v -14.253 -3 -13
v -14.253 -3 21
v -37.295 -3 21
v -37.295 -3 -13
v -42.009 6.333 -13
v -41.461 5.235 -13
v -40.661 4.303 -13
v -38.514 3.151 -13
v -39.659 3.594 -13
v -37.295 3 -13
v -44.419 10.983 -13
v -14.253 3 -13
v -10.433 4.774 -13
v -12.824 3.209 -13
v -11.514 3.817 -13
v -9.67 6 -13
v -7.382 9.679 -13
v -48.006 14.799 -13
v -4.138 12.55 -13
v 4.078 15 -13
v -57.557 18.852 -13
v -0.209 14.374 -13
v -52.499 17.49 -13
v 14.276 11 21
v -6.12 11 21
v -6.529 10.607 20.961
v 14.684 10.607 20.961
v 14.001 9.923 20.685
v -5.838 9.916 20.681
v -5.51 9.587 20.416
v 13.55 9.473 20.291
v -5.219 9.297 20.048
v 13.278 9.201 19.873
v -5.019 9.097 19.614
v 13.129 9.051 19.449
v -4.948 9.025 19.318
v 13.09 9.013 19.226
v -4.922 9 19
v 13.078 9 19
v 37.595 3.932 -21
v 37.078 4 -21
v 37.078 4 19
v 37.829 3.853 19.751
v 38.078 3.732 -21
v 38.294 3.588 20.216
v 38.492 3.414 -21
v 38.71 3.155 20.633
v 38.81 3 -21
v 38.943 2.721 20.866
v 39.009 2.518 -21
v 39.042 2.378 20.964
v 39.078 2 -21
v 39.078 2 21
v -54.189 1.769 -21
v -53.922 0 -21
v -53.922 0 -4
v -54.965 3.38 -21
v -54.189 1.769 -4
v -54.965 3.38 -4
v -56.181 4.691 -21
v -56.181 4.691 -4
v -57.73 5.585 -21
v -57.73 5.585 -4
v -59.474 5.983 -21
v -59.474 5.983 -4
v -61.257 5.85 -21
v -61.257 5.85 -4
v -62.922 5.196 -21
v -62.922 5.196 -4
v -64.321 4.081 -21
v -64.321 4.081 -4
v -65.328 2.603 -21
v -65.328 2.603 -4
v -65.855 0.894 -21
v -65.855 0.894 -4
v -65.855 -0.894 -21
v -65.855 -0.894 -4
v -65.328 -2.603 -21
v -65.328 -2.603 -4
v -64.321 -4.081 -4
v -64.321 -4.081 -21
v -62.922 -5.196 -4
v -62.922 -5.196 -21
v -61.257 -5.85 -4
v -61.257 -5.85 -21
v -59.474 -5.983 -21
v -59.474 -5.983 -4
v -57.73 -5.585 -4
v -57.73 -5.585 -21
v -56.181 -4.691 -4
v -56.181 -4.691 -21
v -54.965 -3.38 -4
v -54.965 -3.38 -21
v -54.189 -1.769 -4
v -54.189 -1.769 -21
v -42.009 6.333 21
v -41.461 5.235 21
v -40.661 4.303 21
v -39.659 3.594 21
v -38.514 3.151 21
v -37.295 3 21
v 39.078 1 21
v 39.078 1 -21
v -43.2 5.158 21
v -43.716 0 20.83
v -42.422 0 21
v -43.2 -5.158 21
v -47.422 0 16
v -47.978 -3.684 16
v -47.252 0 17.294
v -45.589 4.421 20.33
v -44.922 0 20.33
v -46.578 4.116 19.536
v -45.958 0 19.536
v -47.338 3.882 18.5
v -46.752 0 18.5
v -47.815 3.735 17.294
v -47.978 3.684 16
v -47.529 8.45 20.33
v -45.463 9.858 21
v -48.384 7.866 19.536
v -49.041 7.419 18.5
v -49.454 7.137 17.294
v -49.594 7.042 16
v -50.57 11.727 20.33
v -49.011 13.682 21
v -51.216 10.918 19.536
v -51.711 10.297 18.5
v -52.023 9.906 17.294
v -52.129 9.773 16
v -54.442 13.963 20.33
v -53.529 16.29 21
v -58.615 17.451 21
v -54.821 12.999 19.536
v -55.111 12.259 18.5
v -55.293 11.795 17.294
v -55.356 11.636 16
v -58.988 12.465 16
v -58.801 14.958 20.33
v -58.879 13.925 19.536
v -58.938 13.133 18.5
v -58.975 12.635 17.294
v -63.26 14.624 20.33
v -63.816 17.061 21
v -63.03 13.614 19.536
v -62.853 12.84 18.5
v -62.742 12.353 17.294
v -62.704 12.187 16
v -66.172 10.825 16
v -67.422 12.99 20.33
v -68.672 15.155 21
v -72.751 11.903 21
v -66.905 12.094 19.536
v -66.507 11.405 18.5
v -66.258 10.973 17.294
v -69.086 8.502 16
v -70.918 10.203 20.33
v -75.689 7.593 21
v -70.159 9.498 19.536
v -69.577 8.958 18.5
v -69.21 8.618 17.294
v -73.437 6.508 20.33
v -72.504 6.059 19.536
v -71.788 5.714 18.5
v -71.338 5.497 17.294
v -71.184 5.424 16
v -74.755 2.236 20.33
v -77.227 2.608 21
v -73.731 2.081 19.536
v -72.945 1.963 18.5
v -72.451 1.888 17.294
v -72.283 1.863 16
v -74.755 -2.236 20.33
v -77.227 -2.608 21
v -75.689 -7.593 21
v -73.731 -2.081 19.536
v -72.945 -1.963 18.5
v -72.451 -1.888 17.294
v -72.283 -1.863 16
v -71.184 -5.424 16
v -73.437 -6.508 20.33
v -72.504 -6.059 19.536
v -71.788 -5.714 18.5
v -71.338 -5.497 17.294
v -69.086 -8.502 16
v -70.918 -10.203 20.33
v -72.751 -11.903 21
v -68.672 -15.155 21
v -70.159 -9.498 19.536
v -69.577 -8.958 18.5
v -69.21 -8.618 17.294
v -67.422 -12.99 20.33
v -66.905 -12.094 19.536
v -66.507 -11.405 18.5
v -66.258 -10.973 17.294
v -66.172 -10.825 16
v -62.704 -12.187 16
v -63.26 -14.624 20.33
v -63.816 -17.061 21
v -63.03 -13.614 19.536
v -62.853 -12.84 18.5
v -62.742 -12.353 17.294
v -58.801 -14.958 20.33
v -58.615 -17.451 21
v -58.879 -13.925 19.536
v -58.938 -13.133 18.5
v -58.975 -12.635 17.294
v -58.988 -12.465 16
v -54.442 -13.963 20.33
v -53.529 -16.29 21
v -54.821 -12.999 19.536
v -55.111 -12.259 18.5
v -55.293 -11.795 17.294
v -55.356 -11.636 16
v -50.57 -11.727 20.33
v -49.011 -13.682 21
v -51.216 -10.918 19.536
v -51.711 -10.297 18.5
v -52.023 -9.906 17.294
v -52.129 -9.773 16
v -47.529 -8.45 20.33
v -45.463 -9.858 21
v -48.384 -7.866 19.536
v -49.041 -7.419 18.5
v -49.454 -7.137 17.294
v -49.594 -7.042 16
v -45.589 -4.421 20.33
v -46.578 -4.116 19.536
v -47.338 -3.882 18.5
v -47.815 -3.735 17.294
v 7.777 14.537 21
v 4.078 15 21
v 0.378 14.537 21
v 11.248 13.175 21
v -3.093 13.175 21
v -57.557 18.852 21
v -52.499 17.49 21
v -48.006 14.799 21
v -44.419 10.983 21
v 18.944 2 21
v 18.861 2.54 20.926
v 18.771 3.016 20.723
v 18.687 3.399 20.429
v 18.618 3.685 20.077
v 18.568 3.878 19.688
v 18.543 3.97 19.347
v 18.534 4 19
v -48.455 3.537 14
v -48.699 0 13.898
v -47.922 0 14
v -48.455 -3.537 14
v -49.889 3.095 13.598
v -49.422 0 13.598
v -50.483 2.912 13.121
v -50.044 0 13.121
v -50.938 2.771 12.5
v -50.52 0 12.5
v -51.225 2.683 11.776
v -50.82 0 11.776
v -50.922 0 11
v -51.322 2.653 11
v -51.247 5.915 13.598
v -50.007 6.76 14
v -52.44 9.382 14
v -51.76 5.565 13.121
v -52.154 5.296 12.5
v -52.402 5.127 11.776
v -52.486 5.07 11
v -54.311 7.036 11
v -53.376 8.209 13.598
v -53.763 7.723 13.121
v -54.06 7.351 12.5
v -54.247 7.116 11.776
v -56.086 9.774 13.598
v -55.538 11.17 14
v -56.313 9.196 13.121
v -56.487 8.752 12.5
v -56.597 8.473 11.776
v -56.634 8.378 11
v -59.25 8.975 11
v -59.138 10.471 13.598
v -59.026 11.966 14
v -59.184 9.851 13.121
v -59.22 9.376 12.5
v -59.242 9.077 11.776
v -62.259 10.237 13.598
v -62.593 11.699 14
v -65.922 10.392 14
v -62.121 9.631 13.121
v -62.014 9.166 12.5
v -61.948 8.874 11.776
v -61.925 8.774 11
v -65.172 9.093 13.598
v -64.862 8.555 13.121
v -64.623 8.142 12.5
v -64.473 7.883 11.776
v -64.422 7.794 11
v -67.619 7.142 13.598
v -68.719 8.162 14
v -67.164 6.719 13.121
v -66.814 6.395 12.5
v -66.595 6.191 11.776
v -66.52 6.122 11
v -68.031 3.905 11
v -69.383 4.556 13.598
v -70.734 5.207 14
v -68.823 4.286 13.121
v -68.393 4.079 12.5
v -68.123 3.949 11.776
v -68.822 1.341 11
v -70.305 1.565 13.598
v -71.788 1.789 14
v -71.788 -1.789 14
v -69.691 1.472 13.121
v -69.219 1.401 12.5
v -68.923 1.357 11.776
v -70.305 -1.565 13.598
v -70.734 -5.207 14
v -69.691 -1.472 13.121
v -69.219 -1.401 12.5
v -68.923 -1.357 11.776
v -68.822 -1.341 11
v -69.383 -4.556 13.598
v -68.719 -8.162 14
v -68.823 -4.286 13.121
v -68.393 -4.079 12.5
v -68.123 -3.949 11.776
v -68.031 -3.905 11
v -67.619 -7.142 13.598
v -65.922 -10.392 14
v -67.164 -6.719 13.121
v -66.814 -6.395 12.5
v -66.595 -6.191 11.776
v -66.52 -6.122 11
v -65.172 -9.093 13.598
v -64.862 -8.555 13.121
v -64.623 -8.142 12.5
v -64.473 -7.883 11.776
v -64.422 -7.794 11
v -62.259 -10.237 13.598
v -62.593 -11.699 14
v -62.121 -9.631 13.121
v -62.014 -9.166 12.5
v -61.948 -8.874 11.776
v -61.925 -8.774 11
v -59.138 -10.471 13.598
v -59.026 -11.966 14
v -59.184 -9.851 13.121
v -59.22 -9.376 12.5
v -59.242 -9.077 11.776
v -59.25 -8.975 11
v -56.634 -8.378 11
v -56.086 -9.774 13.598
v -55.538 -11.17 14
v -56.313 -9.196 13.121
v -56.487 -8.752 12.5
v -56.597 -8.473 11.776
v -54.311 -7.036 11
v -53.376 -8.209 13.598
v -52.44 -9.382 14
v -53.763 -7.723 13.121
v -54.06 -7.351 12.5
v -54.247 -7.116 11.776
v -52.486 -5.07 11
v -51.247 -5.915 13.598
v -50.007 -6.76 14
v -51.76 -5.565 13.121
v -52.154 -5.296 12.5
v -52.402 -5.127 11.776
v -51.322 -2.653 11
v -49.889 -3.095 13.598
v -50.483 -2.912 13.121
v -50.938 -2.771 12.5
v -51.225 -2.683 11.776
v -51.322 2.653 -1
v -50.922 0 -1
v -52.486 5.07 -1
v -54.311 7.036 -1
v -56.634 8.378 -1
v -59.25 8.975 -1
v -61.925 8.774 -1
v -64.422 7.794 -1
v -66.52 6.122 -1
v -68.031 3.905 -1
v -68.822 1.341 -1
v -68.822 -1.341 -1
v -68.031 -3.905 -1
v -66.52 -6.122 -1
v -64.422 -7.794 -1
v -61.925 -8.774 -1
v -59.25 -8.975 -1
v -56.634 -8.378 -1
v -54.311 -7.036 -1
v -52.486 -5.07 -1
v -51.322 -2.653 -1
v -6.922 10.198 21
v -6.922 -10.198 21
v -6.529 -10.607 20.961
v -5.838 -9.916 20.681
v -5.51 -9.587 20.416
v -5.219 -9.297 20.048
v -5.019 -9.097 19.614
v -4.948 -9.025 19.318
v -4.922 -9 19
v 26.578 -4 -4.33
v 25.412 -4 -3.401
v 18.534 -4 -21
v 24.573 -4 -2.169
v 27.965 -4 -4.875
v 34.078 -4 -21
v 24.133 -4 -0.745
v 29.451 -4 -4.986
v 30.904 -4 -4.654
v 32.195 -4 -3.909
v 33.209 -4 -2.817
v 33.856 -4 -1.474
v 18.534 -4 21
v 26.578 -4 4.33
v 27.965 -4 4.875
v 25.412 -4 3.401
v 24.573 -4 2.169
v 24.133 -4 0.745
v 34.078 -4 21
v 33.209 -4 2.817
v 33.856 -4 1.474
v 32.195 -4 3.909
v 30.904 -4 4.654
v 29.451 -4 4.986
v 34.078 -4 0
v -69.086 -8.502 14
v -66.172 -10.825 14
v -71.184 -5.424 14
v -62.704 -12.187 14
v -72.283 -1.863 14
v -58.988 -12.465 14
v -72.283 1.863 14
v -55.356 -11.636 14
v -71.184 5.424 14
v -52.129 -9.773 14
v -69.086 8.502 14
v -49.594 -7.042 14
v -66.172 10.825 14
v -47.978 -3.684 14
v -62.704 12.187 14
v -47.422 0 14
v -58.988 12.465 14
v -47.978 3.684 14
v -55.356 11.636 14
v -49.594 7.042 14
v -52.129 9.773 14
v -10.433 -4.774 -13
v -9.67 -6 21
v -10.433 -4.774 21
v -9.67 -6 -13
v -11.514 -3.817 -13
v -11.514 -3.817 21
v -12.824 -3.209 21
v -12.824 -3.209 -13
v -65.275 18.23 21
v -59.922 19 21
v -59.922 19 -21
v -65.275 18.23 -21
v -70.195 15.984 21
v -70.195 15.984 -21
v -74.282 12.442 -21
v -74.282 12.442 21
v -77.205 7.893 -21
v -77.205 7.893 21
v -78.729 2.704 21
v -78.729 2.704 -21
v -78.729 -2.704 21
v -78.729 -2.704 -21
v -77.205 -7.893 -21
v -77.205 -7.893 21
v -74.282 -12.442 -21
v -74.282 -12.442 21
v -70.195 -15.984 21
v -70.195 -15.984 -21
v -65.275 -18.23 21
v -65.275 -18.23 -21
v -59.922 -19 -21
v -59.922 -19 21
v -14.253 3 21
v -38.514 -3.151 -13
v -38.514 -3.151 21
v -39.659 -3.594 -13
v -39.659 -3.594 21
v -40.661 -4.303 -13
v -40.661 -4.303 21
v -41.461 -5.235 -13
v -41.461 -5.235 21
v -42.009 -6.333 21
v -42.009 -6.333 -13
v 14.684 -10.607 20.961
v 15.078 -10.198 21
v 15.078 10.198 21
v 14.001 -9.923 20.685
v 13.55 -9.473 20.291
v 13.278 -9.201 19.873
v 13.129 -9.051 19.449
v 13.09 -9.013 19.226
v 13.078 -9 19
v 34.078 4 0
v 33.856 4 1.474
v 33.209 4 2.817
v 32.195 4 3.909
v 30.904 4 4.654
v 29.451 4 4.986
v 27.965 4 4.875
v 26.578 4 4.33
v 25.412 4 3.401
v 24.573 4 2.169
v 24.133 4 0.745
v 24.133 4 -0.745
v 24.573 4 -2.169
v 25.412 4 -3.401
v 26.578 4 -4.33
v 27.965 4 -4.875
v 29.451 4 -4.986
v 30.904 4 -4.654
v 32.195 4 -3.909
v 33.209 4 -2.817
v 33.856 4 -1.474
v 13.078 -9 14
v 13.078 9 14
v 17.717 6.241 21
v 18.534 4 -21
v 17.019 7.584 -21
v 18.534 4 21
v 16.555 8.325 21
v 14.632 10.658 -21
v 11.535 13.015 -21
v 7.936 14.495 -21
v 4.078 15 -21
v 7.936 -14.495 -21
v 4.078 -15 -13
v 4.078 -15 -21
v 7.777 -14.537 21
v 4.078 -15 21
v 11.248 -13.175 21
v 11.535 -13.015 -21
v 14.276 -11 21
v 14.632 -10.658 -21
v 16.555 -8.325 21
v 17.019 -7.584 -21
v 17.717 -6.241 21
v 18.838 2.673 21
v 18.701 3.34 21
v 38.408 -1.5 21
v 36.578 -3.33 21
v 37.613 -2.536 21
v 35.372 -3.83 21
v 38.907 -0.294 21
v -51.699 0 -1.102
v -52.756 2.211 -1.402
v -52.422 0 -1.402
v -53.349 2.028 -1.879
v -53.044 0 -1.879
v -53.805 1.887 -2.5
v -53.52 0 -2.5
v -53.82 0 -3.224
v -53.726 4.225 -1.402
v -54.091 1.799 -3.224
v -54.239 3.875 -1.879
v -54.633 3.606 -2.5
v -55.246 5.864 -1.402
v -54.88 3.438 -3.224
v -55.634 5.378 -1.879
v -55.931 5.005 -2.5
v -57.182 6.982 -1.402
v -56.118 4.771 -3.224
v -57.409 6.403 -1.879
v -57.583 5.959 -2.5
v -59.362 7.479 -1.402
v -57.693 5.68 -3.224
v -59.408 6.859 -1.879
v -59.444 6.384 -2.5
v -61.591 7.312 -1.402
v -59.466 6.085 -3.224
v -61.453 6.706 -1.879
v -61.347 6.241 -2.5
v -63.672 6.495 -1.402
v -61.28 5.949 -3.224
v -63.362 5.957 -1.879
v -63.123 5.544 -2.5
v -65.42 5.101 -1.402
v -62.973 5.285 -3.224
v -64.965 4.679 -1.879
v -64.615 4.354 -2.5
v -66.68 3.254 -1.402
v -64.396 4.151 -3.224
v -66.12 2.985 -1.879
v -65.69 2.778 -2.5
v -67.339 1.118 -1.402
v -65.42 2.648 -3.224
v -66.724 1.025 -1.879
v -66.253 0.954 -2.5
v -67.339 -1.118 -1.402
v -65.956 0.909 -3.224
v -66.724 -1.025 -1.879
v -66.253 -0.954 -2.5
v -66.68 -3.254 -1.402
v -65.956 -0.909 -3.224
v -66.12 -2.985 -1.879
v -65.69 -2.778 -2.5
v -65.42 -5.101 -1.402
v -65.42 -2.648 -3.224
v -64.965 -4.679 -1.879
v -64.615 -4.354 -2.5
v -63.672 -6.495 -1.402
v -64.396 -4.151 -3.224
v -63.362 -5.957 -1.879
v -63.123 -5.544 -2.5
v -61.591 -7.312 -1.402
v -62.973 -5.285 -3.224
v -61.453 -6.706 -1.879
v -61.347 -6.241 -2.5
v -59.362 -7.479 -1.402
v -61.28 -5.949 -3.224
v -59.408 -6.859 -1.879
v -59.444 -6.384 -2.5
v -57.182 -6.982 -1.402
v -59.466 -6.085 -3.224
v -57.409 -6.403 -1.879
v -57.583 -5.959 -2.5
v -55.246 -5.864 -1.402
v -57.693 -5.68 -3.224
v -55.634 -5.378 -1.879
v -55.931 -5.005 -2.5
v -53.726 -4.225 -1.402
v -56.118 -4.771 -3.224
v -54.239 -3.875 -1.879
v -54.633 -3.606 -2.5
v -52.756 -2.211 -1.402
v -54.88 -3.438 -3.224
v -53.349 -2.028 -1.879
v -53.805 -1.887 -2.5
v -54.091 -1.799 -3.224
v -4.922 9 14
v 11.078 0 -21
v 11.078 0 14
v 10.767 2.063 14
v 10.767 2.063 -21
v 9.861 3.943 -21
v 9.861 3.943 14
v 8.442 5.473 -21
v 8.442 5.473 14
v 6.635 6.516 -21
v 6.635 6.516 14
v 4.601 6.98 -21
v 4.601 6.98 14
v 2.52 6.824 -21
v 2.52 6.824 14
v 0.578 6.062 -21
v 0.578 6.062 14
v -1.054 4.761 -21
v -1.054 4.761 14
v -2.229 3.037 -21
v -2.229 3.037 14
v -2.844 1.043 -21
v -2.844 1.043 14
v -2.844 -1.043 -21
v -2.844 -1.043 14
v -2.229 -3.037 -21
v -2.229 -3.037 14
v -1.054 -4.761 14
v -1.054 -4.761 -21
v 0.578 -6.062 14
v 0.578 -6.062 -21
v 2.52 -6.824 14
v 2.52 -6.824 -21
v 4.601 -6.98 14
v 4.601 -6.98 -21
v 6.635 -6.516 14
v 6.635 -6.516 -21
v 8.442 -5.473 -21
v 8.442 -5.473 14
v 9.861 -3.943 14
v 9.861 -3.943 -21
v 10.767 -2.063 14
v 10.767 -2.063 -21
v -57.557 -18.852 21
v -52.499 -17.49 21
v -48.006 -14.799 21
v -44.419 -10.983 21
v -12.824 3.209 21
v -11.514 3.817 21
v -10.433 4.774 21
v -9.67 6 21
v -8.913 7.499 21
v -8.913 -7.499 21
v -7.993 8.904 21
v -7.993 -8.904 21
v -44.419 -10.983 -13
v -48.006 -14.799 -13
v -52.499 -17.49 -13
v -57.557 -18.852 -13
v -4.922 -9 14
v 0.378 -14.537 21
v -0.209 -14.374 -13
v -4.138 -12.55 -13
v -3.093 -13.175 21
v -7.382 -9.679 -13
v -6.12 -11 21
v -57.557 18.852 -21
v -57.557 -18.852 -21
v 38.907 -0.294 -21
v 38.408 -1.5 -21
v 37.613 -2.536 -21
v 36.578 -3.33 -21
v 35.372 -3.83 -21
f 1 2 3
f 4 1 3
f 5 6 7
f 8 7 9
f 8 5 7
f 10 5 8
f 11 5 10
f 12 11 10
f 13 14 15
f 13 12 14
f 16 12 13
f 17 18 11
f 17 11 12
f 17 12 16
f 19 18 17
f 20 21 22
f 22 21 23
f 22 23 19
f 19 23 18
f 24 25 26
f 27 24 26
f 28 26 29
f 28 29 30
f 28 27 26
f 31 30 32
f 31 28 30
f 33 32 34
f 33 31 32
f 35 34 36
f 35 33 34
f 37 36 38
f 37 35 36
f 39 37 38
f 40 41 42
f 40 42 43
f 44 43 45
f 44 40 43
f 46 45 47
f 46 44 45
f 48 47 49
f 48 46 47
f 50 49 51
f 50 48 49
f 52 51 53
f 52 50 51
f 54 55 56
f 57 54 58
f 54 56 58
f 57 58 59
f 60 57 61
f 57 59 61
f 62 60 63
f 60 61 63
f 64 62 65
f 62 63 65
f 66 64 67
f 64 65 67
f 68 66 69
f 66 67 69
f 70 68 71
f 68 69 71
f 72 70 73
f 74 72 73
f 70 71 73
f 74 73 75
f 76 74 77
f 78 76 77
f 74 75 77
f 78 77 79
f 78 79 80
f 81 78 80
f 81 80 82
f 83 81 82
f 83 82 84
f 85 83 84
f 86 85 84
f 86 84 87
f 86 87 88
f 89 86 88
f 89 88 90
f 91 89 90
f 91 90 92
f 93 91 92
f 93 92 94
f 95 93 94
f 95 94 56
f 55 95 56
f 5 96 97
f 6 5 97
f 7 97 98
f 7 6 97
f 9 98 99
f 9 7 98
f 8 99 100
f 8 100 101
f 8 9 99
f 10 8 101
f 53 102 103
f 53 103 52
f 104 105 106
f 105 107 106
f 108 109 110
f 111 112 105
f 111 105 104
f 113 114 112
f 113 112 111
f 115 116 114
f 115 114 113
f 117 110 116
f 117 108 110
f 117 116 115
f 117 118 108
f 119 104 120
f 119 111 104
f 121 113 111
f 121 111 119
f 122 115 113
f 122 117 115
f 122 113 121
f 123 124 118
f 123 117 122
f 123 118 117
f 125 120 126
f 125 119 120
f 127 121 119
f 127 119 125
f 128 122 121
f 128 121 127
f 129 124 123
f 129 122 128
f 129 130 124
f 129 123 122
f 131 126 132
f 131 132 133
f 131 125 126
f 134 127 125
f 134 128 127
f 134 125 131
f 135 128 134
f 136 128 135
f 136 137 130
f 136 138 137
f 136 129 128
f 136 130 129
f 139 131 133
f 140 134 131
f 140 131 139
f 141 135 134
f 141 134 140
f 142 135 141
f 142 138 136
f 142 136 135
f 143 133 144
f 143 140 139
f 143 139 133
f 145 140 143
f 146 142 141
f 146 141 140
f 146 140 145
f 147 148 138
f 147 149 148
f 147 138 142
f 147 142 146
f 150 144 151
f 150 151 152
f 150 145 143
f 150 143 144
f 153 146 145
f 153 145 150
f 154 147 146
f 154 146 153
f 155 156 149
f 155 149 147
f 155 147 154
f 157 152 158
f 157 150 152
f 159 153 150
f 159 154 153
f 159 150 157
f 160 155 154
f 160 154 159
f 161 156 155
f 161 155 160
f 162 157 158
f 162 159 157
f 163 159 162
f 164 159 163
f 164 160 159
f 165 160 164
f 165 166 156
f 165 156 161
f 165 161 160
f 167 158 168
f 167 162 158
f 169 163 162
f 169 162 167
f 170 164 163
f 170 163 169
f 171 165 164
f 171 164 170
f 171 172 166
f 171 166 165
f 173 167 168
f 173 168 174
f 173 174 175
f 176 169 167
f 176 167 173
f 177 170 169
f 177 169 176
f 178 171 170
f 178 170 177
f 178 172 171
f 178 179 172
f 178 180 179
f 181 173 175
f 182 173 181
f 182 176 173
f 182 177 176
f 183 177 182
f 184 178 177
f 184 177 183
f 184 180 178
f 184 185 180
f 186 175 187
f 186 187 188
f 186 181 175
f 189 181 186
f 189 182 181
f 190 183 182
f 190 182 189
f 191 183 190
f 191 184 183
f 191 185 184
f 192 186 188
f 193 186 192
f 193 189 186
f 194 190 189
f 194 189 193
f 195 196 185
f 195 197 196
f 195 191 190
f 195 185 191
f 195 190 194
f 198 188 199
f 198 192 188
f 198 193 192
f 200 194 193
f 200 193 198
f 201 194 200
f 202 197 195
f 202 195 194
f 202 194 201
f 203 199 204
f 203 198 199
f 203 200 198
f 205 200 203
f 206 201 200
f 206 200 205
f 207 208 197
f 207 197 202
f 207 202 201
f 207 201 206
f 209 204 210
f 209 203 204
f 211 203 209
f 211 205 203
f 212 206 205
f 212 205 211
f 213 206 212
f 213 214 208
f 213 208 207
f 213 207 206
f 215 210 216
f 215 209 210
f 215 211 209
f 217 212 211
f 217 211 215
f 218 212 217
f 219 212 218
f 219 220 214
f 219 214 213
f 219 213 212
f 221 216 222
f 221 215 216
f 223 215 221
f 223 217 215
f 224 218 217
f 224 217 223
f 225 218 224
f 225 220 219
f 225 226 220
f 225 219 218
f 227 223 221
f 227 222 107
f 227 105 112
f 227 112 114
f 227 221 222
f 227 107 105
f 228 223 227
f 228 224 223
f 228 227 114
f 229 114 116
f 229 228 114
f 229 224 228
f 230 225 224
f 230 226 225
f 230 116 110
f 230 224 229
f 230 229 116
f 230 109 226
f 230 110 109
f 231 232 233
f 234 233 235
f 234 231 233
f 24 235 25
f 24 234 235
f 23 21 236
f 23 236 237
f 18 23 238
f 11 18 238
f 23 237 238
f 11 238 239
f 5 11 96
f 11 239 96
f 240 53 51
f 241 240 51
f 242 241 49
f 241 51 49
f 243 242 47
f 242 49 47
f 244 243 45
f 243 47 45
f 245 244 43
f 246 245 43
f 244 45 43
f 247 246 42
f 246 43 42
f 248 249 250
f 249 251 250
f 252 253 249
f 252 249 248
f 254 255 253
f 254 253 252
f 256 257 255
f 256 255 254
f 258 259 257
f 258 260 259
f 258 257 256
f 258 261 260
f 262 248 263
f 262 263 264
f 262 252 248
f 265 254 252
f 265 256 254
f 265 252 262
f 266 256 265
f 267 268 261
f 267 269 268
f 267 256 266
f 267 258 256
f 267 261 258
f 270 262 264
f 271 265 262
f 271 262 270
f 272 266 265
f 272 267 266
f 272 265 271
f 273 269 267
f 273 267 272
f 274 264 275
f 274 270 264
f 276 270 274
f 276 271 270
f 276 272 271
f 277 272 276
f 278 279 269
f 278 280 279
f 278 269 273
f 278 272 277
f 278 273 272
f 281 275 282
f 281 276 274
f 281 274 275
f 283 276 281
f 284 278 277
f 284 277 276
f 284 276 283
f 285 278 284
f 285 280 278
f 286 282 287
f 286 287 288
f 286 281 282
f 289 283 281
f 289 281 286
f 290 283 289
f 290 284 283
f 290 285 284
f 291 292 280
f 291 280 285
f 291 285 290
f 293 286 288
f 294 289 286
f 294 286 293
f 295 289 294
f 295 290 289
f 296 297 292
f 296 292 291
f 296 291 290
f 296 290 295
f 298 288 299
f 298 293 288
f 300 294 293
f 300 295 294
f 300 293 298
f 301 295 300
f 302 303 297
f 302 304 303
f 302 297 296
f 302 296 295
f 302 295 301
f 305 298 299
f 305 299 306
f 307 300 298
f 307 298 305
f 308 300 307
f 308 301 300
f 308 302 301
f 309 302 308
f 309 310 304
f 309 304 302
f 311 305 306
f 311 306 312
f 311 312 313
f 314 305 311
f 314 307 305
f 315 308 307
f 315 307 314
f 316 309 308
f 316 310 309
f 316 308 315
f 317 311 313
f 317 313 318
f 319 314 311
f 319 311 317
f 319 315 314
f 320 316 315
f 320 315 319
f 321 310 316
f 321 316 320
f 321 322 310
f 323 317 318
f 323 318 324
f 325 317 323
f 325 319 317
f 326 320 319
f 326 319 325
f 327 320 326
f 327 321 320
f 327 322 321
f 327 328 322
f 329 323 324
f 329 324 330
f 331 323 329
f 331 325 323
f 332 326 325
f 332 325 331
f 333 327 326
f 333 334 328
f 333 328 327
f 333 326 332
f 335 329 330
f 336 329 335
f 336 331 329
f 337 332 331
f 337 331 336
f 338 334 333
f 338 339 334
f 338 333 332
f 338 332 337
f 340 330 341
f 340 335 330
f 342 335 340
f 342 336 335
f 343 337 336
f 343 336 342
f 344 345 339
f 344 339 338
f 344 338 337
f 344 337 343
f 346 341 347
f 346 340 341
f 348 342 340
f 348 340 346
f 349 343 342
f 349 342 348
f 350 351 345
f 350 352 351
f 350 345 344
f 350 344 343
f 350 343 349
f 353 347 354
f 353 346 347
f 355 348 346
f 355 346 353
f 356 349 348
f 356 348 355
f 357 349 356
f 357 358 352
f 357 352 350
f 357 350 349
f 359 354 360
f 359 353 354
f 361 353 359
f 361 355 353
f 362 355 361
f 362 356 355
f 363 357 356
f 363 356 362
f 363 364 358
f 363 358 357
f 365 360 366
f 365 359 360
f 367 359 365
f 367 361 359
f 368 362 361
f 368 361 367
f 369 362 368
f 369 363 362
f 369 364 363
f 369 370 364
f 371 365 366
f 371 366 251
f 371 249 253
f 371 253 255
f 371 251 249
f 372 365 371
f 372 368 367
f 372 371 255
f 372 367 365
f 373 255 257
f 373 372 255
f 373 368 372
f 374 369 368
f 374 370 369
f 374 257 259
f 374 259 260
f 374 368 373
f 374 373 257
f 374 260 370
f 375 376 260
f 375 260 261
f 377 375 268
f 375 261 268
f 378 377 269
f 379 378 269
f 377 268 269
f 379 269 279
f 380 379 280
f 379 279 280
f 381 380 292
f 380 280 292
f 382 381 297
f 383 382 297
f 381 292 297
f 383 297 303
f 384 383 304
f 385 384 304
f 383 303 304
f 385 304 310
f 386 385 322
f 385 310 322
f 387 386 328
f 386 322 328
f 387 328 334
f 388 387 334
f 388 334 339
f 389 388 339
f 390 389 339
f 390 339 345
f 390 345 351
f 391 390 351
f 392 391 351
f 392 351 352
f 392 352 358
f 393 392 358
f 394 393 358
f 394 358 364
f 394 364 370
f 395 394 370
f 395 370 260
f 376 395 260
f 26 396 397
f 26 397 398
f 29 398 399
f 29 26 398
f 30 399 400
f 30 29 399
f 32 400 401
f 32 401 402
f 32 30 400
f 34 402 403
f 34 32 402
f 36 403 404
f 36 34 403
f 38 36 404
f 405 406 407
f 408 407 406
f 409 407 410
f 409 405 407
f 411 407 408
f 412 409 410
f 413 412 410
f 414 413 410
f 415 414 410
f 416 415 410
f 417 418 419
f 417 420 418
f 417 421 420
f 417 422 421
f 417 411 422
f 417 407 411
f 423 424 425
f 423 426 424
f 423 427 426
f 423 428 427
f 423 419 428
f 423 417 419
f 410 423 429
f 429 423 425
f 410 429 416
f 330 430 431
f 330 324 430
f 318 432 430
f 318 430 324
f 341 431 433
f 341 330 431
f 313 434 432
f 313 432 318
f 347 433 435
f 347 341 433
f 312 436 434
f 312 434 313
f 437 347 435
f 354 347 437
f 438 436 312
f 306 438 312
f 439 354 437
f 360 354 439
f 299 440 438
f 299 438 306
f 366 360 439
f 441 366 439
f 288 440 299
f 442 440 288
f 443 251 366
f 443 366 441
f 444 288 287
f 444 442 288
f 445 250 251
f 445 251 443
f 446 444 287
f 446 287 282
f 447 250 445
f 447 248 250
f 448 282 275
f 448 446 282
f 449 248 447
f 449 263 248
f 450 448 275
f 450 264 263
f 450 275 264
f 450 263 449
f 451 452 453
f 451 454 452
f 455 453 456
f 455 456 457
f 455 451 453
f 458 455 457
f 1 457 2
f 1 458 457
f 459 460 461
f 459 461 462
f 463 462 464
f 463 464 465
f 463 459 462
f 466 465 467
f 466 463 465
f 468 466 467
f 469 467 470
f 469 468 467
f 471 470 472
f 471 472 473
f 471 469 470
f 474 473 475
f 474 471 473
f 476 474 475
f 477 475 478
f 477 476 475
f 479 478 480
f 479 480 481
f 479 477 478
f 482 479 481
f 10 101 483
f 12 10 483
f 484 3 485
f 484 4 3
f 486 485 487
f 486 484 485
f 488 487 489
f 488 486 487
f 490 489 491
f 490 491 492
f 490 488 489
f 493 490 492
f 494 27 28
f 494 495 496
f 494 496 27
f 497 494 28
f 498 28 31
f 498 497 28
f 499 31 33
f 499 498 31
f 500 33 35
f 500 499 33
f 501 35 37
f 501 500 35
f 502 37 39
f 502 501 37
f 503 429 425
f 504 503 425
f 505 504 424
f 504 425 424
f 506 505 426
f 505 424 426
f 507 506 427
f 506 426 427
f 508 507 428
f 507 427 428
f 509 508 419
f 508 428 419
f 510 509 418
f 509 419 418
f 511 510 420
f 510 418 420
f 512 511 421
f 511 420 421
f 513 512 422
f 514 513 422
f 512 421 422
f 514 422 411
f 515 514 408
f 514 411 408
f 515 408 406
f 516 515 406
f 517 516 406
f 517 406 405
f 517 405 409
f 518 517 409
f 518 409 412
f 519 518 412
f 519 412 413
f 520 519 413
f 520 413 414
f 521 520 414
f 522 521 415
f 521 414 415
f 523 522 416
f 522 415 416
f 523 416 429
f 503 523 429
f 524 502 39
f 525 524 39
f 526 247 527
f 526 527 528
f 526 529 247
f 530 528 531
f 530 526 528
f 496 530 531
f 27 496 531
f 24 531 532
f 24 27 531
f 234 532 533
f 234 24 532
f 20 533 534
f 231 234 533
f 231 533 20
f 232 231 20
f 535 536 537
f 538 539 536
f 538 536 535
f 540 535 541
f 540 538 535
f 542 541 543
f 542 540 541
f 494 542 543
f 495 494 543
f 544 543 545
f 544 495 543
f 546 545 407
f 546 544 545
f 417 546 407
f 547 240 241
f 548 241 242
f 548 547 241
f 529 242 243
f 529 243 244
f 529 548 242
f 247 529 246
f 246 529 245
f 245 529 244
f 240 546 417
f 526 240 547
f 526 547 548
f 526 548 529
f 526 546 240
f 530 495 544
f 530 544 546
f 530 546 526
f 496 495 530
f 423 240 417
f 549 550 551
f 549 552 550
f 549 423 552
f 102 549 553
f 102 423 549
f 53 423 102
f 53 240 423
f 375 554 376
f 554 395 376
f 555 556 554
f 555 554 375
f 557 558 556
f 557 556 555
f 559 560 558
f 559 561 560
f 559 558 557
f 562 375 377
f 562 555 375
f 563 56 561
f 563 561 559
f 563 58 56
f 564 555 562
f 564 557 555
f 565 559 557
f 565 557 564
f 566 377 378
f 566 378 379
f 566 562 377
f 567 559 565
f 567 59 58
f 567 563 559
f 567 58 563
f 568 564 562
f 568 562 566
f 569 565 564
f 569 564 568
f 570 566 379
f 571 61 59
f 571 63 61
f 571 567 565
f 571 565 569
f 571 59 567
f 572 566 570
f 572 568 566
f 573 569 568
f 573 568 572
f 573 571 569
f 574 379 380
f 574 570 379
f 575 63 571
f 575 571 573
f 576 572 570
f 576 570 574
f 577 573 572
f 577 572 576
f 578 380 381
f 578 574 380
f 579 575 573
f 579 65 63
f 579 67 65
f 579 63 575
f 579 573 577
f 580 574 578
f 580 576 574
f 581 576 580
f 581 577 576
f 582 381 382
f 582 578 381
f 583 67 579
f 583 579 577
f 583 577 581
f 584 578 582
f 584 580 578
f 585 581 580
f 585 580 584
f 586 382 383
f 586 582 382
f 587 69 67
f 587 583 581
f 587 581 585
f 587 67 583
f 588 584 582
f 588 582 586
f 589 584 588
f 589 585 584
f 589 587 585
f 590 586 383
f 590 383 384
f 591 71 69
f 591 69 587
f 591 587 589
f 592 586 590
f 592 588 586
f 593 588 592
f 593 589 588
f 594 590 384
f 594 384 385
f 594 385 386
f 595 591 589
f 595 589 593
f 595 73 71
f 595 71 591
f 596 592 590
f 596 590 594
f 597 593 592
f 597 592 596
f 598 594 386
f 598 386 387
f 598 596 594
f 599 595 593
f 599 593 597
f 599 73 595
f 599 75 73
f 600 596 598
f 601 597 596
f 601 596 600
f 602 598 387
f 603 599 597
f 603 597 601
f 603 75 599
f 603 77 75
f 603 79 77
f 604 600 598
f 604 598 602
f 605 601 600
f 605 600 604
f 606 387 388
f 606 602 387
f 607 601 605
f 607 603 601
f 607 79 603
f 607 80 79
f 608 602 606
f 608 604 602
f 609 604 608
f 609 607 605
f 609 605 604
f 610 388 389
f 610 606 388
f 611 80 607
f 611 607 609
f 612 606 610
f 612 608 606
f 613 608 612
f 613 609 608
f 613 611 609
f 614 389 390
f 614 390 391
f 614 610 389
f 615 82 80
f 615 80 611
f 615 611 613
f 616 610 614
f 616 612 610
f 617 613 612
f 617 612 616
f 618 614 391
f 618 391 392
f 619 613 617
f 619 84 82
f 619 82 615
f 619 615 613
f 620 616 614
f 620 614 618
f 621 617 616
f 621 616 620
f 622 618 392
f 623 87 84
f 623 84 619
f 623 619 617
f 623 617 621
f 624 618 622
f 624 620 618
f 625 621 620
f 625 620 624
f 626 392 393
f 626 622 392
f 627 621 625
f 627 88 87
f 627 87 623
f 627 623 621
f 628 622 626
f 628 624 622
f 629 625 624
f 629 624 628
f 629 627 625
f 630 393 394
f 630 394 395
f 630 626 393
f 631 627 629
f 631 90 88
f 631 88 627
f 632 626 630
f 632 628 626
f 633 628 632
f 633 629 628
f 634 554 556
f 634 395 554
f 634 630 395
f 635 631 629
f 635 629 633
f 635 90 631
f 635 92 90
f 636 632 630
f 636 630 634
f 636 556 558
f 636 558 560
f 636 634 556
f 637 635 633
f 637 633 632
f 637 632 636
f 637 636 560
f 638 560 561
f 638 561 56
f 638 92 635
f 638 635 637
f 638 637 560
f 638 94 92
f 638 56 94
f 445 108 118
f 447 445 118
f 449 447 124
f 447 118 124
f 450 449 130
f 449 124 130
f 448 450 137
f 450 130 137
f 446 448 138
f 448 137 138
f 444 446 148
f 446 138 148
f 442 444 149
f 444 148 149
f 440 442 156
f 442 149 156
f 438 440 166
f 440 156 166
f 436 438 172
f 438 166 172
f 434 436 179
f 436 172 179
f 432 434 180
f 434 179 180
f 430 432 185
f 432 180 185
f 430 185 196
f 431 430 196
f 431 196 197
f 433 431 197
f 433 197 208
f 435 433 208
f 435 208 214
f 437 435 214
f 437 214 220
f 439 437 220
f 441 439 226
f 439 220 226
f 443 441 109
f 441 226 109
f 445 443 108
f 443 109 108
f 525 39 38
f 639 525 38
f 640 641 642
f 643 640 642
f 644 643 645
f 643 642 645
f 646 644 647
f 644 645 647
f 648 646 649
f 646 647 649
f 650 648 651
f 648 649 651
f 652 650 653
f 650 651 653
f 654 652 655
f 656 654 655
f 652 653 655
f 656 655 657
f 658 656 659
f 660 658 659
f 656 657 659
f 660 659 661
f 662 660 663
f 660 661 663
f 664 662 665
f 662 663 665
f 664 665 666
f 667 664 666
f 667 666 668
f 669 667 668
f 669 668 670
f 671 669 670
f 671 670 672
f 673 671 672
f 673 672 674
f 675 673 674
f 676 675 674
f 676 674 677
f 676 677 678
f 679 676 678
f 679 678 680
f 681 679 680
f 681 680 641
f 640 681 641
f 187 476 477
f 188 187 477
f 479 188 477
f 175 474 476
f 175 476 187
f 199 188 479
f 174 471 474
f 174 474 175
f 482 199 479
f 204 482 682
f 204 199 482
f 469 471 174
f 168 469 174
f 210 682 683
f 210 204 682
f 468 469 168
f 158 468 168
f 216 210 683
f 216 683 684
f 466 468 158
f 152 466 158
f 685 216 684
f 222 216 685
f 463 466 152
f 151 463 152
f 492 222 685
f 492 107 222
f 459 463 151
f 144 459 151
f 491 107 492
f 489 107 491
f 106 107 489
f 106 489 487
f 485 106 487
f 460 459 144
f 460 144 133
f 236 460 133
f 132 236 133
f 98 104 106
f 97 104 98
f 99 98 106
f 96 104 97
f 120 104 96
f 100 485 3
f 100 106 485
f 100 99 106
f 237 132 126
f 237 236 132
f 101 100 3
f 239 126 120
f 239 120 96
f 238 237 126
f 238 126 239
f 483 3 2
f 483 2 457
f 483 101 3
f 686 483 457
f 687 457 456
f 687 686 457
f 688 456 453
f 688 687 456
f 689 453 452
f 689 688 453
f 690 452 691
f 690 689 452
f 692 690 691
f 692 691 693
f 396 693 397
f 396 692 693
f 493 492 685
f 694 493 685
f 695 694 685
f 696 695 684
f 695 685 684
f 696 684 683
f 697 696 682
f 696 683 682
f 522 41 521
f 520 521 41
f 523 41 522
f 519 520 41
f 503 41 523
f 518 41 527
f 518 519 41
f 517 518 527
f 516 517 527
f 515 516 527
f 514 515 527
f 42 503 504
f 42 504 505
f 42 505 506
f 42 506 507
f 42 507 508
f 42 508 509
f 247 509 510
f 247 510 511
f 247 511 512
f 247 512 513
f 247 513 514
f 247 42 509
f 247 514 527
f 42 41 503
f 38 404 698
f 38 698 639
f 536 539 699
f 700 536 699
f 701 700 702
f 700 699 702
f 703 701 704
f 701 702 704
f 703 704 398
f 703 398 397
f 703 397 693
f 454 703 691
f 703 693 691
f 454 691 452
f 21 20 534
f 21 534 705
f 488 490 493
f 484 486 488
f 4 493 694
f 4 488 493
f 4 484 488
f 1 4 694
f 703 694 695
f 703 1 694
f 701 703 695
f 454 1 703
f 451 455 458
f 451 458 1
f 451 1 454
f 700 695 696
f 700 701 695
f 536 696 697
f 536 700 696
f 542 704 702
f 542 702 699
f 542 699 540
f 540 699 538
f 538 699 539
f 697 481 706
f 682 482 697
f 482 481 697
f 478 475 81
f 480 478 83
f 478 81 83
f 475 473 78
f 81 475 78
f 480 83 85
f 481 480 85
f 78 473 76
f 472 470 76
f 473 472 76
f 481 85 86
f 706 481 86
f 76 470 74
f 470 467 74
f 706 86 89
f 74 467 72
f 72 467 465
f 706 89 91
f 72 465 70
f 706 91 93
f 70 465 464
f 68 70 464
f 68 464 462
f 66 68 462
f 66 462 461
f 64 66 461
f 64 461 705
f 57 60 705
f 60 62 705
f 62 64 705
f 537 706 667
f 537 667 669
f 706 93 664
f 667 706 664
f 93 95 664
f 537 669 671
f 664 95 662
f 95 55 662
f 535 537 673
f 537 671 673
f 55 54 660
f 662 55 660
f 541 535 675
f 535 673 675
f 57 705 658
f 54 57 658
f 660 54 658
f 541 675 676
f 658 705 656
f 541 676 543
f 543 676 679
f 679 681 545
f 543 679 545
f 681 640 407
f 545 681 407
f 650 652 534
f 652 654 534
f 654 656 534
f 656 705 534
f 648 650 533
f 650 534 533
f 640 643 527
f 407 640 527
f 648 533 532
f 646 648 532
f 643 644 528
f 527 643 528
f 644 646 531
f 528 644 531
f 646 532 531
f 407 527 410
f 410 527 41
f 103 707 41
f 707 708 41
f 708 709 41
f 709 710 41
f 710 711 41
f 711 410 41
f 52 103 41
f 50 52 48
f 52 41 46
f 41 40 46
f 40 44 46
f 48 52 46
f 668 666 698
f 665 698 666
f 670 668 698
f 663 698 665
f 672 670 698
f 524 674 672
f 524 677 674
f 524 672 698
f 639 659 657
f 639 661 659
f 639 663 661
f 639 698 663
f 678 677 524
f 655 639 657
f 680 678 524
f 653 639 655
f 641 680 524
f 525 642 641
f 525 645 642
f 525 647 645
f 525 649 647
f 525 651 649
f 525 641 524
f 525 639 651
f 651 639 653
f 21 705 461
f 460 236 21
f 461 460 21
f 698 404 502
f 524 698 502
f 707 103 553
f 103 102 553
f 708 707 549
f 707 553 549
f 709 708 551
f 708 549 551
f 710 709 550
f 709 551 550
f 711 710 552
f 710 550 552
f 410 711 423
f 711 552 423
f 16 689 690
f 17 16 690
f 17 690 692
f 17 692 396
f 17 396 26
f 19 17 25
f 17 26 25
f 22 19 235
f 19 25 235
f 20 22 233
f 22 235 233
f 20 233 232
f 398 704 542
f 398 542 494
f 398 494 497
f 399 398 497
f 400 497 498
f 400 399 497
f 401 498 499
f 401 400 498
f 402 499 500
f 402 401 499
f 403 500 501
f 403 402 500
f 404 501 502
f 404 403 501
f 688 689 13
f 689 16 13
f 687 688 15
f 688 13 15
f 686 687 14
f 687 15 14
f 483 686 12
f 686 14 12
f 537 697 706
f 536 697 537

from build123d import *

# Parameters (mm, degrees)
F1_DEPTH       = 21
F1_DEPTH_BACK  = 21
F3_DEPTH       = 34
F4_R           = 6
F4_R_2         = 7
F5_DEPTH       = 42
F6_R           = 9
F6_R_2         = 6
F7_DEPTH       = 22
F8_W           = 18
F8_H           = 18
F8_R           = 7
F9_DEPTH       = 7
F10_R          = 12.5
F11_DEPTH      = 7
F12_R          = 5
F13_DEPTH      = 8
F13_DEPTH_BACK = 8
F14_R          = 4.99999
F15_T1_DEPTH   = 18
F15_T3_DEPTH   = 18
F15_T5_DEPTH   = 52
F15_T10_DEPTH  = 30.5431677052
F15_S11_R      = 15
F15_T12_DEPTH  = 17
F15_T17_DEPTH  = 23
F15_T21_DEPTH  = 23
F15_T28_DEPTH  = 23
F15_T32_DEPTH  = 23
F15_T39_DEPTH  = 23
F15_T43_DEPTH  = 23
F15_T50_DEPTH  = 23
F15_T54_DEPTH  = 23
F16_R          = 2.99999


# Not quite as in the source:
# - a fillet or chamfer that OpenCascade refuses, or shapes differently, is made with other operations: its cross-section is extruded or revolved along the edge and cut away or added
# - a fillet or chamfer is up to 0.001 mm smaller than in the source, because OpenCascade refuses the exact size


with BuildPart() as f1:
    # F0 (on Top) → F1 (new body, two sides)
    with BuildSketch(Plane.XY) as f1_sk:
        with BuildLine():
            Line((4.0776433051, 15), (-57.5565979401, 18.8521400778))
            Line((-57.5565979401, 18.8521400778), (-59.9223566949, 19))
            ThreePointArc((-59.9223566949, 19), (-78.9223566949, 0), (-59.9223566949, -19))
            Line((-59.9223566949, -19), (-57.5565979401, -18.8521400778))
            Line((-57.5565979401, -18.8521400778), (4.0776433051, -15))
            ThreePointArc((4.0776433051, -15), (13.1605943674, -11.9373363863), (18.5344755999, -4))
            ThreePointArc((18.5344755999, -4), (19.0776433051, 0), (18.5344755999, 4))
            ThreePointArc((18.5344755999, 4), (13.1605943674, 11.9373363863), (4.0776433051, 15))
        make_face()
        with BuildLine():
            Line((39.0776433051, 4), (18.5344755999, 4))
            ThreePointArc((18.5344755999, 4), (19.0776433051, 0), (18.5344755999, -4))
            Line((18.5344755999, -4), (39.0776433051, -4))
            Line((39.0776433051, -4), (39.0776433051, 4))
        make_face()
    extrude(amount=F1_DEPTH)
    extrude(f1_sk.sketch, amount=-F1_DEPTH_BACK)

    # F2 (on face) → F3 (cut)
    with BuildSketch(Plane.XY.offset(21)):
        with BuildLine():
            Line((-57.5565979401, -18.8521400778), (-59.9223566949, -19))
            ThreePointArc((-59.9223566949, -19), (-58.737169258, -18.9629989912), (-57.5565979401, -18.8521400778))
        make_face()
        with BuildLine():
            ThreePointArc((-41.1606936556, -3), (-46.7157456922, -13.6596275872), (-57.5565979401, -18.8521400778))
            Line((-57.5565979401, -18.8521400778), (4.0776433051, -15))
            ThreePointArc((4.0776433051, -15), (-5.4091896754, -11.6189500386), (-10.6192951516, -3))
            Line((-10.6192951516, -3), (-41.1606936556, -3))
        make_face()
        with BuildLine():
            Line((-59.9223566949, 19), (-57.5565979401, 18.8521400778))
            ThreePointArc((-57.5565979401, 18.8521400778), (-58.737169258, 18.9629989912), (-59.9223566949, 19))
        make_face()
        with BuildLine():
            ThreePointArc((-10.6192951516, 3), (-5.4091896754, 11.6189500386), (4.0776433051, 15))
            Line((4.0776433051, 15), (-57.5565979401, 18.8521400778))
            ThreePointArc((-57.5565979401, 18.8521400778), (-46.7157456922, 13.6596275872), (-41.1606936556, 3))
            Line((-41.1606936556, 3), (-10.6192951516, 3))
        make_face()
    extrude(amount=-F3_DEPTH, mode=Mode.SUBTRACT)

    # F4 (on face) → F5 (cut)
    with BuildSketch(Plane.XY.offset(21)):
        with Locations((-59.9223566949, 0)):
            Circle(F4_R)
        with Locations((4.0776433051, 0)):
            Circle(F4_R_2)
    extrude(amount=-F5_DEPTH, mode=Mode.SUBTRACT)

    # F6 (on face) → F7 (cut)
    with BuildSketch(Plane.XY.offset(21)):
        with Locations((-59.9223566949, 0)):
            Circle(F6_R)
        with Locations((-59.9223566949, 0)):
            Circle(F6_R_2, mode=Mode.SUBTRACT)
    extrude(amount=-F7_DEPTH, mode=Mode.SUBTRACT)

    # F8 (on face) → F9 (cut)
    with BuildSketch(Plane.XY.offset(21)):
        with Locations((4.0776433051, 0)):
            Rectangle(F8_W, F8_H)
        with Locations((4.0776433051, 0)):
            Circle(F8_R, mode=Mode.SUBTRACT)
    extrude(amount=-F9_DEPTH, mode=Mode.SUBTRACT)

    # F10 (on face) → F11 (cut)
    with BuildSketch(Plane.XY.offset(21)):
        with Locations((-59.9223566949, 0)):
            Circle(F10_R)
    extrude(amount=-F11_DEPTH, mode=Mode.SUBTRACT)

    # F12 (on face) → F13 (cut, two sides)
    with BuildSketch(Plane.XZ.offset(4)) as f13_sk:
        with Locations((29.0776433051, 0)):
            Circle(F12_R)
    extrude(amount=-F13_DEPTH, mode=Mode.SUBTRACT)
    extrude(f13_sk.sketch, amount=F13_DEPTH_BACK, mode=Mode.SUBTRACT)

    # F14 (radius 5 in the source; OpenCascade refuses exactly that, so slightly less here)
    f14_edges = [f1.edges().sort_by_distance(p)[0] for p in [
        (-41.160694, -3, 4),
        (-10.619295, -3, 4),
        (-10.619295, 3, 4),
        (-41.160694, 3, 4),
        (-72.422357, 0, 21),
        (39.077643, -4, 0),
    ]]
    fillet(f14_edges, radius=F14_R)

    # F15: fillet of radius 2 on 6 edges, made by hand

    # F15_s2 → F15_t1 (cut)
    with BuildSketch(Plane.XZ.offset(-9)):
        with BuildLine():
            ThreePointArc((-6.9223566949, 21), (-5.5081431326, 20.4142135624), (-4.9223566949, 19))
            Line((-4.9223566949, 19), (-4.9223566949, 21))
            Line((-4.9223566949, 21), (-6.9223566949, 21))
        make_face()
        with BuildLine():
            ThreePointArc((15.0776433051, 21), (13.6634297427, 20.4142135624), (13.0776433051, 19))
            Line((13.0776433051, 19), (13.0776433051, 21))
            Line((13.0776433051, 21), (15.0776433051, 21))
        make_face()
    extrude(amount=F15_T1_DEPTH, mode=Mode.SUBTRACT)

    # F15_s4 → F15_t3 (cut)
    with BuildSketch(Plane.YZ.offset(-4.9223566949)):
        with BuildLine():
            ThreePointArc((11, 21), (9.5857864376, 20.4142135624), (9, 19))
            Line((9, 19), (9, 21))
            Line((9, 21), (11, 21))
        make_face()
        with BuildLine():
            ThreePointArc((-11, 21), (-9.5857864376, 20.4142135624), (-9, 19))
            Line((-9, 19), (-9, 21))
            Line((-9, 21), (-11, 21))
        make_face()
    extrude(amount=F15_T3_DEPTH, mode=Mode.SUBTRACT)

    # F15_s6 → F15_t5 (cut)
    with BuildSketch(Plane.XY.offset(-26)):
        with BuildLine():
            ThreePointArc((37.0776433051, 4), (38.4918568674, 3.4142135624), (39.0776433051, 2))
            Line((39.0776433051, 2), (39.0776433051, 4))
            Line((39.0776433051, 4), (37.0776433051, 4))
        make_face()
    extrude(amount=F15_T5_DEPTH, mode=Mode.SUBTRACT)


with BuildPart() as f15_tool8:
    # F15_s9 → F15_t10 (new body)
    with BuildSketch(Plane.YZ.offset(44.0776433051)):
        with BuildLine():
            ThreePointArc((2, 21), (3.4142135624, 20.4142135624), (4, 19))
            Line((4, 19), (4, 21))
            Line((4, 21), (2, 21))
        make_face()
    extrude(amount=-F15_T10_DEPTH)

    # F15_s11 → F15_t12 (cut, symmetric)
    with BuildSketch(Plane.XY.offset(20)):
        with Locations((4.0776433051, 0)):
            Circle(F15_S11_R)
    extrude(amount=F15_T12_DEPTH, both=True, mode=Mode.SUBTRACT)


with BuildPart() as f1_1:
    add(f1.part)

    # F15_t7: cut F15_tool8
    add(f15_tool8.part, mode=Mode.SUBTRACT)


with BuildPart() as f15_tool15:
    # F15_s16 → F15_t17 (new body)
    with BuildSketch(Plane.XZ.offset(-14)):
        with BuildLine():
            ThreePointArc((-6.9223566949, 21), (-5.5081431326, 20.4142135624), (-4.9223566949, 19))
            Line((-4.9223566949, 19), (-4.9223566949, 21))
            Line((-4.9223566949, 21), (-6.9223566949, 21))
        make_face()
    extrude(amount=F15_T17_DEPTH)

    split(bisect_by=Plane.XZ.offset(-9), keep=Keep.BOTTOM)


with BuildPart() as f15_tool19:
    # F15_s20 → F15_t21 (new body)
    with BuildSketch(Plane.YZ.offset(13.0776433051)):
        with BuildLine():
            ThreePointArc((11, 21), (9.5857864376, 20.4142135624), (9, 19))
            Line((9, 19), (9, 21))
            Line((9, 21), (11, 21))
        make_face()
    extrude(amount=-F15_T21_DEPTH)

    split(bisect_by=Plane.YZ.offset(-4.9223566949), keep=Keep.BOTTOM)


with BuildPart() as f15_tool15_1:
    add(f15_tool15.part)

    # F15_t23: intersect F15_tool19
    add(f15_tool19.part, mode=Mode.INTERSECT)


with BuildPart() as f1_2:
    add(f1_1.part)

    # F15_t13: cut F15_tool15
    add(f15_tool15_1.part, mode=Mode.SUBTRACT)


with BuildPart() as f15_tool26:
    # F15_s27 → F15_t28 (new body)
    with BuildSketch(Plane.YZ.offset(-9.9223566949)):
        with BuildLine():
            ThreePointArc((-11, 21), (-9.5857864376, 20.4142135624), (-9, 19))
            Line((-9, 19), (-9, 21))
            Line((-9, 21), (-11, 21))
        make_face()
    extrude(amount=F15_T28_DEPTH)

    split(bisect_by=Plane.YZ.offset(-4.9223566949), keep=Keep.BOTTOM)


with BuildPart() as f15_tool30:
    # F15_s31 → F15_t32 (new body)
    with BuildSketch(Plane.XZ.offset(-9)):
        with BuildLine():
            ThreePointArc((-6.9223566949, 21), (-5.5081431326, 20.4142135624), (-4.9223566949, 19))
            Line((-4.9223566949, 19), (-4.9223566949, 21))
            Line((-4.9223566949, 21), (-6.9223566949, 21))
        make_face()
    extrude(amount=F15_T32_DEPTH)

    split(bisect_by=Plane.XZ.offset(9), keep=Keep.TOP)


with BuildPart() as f15_tool26_1:
    add(f15_tool26.part)

    # F15_t34: intersect F15_tool30
    add(f15_tool30.part, mode=Mode.INTERSECT)


with BuildPart() as f1_3:
    add(f1_2.part)

    # F15_t24: cut F15_tool26
    add(f15_tool26_1.part, mode=Mode.SUBTRACT)


with BuildPart() as f15_tool37:
    # F15_s38 → F15_t39 (new body)
    with BuildSketch(Plane.XZ.offset(9)):
        with BuildLine():
            ThreePointArc((15.0776433051, 21), (13.6634297427, 20.4142135624), (13.0776433051, 19))
            Line((13.0776433051, 19), (13.0776433051, 21))
            Line((13.0776433051, 21), (15.0776433051, 21))
        make_face()
    extrude(amount=-F15_T39_DEPTH)

    split(bisect_by=Plane.XZ.offset(-9), keep=Keep.BOTTOM)


with BuildPart() as f15_tool41:
    # F15_s42 → F15_t43 (new body)
    with BuildSketch(Plane.YZ.offset(18.0776433051)):
        with BuildLine():
            ThreePointArc((11, 21), (9.5857864376, 20.4142135624), (9, 19))
            Line((9, 19), (9, 21))
            Line((9, 21), (11, 21))
        make_face()
    extrude(amount=-F15_T43_DEPTH)

    split(bisect_by=Plane.YZ.offset(13.0776433051), keep=Keep.TOP)


with BuildPart() as f15_tool37_1:
    add(f15_tool37.part)

    # F15_t45: intersect F15_tool41
    add(f15_tool41.part, mode=Mode.INTERSECT)


with BuildPart() as f1_4:
    add(f1_3.part)

    # F15_t35: cut F15_tool37
    add(f15_tool37_1.part, mode=Mode.SUBTRACT)


with BuildPart() as f15_tool48:
    # F15_s49 → F15_t50 (new body)
    with BuildSketch(Plane.YZ.offset(-4.9223566949)):
        with BuildLine():
            ThreePointArc((-11, 21), (-9.5857864376, 20.4142135624), (-9, 19))
            Line((-9, 19), (-9, 21))
            Line((-9, 21), (-11, 21))
        make_face()
    extrude(amount=F15_T50_DEPTH)

    split(bisect_by=Plane.YZ.offset(13.0776433051), keep=Keep.TOP)


with BuildPart() as f15_tool52:
    # F15_s53 → F15_t54 (new body)
    with BuildSketch(Plane.XZ.offset(14)):
        with BuildLine():
            ThreePointArc((15.0776433051, 21), (13.6634297427, 20.4142135624), (13.0776433051, 19))
            Line((13.0776433051, 19), (13.0776433051, 21))
            Line((13.0776433051, 21), (15.0776433051, 21))
        make_face()
    extrude(amount=-F15_T54_DEPTH)

    split(bisect_by=Plane.XZ.offset(9), keep=Keep.TOP)


with BuildPart() as f15_tool48_1:
    add(f15_tool48.part)

    # F15_t56: intersect F15_tool52
    add(f15_tool52.part, mode=Mode.INTERSECT)


with BuildPart() as f1_5:
    add(f1_4.part)

    # F15_t46: cut F15_tool48
    add(f15_tool48_1.part, mode=Mode.SUBTRACT)

    # F16 (radius 3 in the source; OpenCascade refuses exactly that, so slightly less here)
    f16_edges = [f1_5.edges().sort_by_distance(p)[0] for p in [
        (-68.922357, 0, 14),
        (-65.922357, 0, -1),
    ]]
    fillet(f16_edges, radius=F16_R)


solid = f1_5.part
